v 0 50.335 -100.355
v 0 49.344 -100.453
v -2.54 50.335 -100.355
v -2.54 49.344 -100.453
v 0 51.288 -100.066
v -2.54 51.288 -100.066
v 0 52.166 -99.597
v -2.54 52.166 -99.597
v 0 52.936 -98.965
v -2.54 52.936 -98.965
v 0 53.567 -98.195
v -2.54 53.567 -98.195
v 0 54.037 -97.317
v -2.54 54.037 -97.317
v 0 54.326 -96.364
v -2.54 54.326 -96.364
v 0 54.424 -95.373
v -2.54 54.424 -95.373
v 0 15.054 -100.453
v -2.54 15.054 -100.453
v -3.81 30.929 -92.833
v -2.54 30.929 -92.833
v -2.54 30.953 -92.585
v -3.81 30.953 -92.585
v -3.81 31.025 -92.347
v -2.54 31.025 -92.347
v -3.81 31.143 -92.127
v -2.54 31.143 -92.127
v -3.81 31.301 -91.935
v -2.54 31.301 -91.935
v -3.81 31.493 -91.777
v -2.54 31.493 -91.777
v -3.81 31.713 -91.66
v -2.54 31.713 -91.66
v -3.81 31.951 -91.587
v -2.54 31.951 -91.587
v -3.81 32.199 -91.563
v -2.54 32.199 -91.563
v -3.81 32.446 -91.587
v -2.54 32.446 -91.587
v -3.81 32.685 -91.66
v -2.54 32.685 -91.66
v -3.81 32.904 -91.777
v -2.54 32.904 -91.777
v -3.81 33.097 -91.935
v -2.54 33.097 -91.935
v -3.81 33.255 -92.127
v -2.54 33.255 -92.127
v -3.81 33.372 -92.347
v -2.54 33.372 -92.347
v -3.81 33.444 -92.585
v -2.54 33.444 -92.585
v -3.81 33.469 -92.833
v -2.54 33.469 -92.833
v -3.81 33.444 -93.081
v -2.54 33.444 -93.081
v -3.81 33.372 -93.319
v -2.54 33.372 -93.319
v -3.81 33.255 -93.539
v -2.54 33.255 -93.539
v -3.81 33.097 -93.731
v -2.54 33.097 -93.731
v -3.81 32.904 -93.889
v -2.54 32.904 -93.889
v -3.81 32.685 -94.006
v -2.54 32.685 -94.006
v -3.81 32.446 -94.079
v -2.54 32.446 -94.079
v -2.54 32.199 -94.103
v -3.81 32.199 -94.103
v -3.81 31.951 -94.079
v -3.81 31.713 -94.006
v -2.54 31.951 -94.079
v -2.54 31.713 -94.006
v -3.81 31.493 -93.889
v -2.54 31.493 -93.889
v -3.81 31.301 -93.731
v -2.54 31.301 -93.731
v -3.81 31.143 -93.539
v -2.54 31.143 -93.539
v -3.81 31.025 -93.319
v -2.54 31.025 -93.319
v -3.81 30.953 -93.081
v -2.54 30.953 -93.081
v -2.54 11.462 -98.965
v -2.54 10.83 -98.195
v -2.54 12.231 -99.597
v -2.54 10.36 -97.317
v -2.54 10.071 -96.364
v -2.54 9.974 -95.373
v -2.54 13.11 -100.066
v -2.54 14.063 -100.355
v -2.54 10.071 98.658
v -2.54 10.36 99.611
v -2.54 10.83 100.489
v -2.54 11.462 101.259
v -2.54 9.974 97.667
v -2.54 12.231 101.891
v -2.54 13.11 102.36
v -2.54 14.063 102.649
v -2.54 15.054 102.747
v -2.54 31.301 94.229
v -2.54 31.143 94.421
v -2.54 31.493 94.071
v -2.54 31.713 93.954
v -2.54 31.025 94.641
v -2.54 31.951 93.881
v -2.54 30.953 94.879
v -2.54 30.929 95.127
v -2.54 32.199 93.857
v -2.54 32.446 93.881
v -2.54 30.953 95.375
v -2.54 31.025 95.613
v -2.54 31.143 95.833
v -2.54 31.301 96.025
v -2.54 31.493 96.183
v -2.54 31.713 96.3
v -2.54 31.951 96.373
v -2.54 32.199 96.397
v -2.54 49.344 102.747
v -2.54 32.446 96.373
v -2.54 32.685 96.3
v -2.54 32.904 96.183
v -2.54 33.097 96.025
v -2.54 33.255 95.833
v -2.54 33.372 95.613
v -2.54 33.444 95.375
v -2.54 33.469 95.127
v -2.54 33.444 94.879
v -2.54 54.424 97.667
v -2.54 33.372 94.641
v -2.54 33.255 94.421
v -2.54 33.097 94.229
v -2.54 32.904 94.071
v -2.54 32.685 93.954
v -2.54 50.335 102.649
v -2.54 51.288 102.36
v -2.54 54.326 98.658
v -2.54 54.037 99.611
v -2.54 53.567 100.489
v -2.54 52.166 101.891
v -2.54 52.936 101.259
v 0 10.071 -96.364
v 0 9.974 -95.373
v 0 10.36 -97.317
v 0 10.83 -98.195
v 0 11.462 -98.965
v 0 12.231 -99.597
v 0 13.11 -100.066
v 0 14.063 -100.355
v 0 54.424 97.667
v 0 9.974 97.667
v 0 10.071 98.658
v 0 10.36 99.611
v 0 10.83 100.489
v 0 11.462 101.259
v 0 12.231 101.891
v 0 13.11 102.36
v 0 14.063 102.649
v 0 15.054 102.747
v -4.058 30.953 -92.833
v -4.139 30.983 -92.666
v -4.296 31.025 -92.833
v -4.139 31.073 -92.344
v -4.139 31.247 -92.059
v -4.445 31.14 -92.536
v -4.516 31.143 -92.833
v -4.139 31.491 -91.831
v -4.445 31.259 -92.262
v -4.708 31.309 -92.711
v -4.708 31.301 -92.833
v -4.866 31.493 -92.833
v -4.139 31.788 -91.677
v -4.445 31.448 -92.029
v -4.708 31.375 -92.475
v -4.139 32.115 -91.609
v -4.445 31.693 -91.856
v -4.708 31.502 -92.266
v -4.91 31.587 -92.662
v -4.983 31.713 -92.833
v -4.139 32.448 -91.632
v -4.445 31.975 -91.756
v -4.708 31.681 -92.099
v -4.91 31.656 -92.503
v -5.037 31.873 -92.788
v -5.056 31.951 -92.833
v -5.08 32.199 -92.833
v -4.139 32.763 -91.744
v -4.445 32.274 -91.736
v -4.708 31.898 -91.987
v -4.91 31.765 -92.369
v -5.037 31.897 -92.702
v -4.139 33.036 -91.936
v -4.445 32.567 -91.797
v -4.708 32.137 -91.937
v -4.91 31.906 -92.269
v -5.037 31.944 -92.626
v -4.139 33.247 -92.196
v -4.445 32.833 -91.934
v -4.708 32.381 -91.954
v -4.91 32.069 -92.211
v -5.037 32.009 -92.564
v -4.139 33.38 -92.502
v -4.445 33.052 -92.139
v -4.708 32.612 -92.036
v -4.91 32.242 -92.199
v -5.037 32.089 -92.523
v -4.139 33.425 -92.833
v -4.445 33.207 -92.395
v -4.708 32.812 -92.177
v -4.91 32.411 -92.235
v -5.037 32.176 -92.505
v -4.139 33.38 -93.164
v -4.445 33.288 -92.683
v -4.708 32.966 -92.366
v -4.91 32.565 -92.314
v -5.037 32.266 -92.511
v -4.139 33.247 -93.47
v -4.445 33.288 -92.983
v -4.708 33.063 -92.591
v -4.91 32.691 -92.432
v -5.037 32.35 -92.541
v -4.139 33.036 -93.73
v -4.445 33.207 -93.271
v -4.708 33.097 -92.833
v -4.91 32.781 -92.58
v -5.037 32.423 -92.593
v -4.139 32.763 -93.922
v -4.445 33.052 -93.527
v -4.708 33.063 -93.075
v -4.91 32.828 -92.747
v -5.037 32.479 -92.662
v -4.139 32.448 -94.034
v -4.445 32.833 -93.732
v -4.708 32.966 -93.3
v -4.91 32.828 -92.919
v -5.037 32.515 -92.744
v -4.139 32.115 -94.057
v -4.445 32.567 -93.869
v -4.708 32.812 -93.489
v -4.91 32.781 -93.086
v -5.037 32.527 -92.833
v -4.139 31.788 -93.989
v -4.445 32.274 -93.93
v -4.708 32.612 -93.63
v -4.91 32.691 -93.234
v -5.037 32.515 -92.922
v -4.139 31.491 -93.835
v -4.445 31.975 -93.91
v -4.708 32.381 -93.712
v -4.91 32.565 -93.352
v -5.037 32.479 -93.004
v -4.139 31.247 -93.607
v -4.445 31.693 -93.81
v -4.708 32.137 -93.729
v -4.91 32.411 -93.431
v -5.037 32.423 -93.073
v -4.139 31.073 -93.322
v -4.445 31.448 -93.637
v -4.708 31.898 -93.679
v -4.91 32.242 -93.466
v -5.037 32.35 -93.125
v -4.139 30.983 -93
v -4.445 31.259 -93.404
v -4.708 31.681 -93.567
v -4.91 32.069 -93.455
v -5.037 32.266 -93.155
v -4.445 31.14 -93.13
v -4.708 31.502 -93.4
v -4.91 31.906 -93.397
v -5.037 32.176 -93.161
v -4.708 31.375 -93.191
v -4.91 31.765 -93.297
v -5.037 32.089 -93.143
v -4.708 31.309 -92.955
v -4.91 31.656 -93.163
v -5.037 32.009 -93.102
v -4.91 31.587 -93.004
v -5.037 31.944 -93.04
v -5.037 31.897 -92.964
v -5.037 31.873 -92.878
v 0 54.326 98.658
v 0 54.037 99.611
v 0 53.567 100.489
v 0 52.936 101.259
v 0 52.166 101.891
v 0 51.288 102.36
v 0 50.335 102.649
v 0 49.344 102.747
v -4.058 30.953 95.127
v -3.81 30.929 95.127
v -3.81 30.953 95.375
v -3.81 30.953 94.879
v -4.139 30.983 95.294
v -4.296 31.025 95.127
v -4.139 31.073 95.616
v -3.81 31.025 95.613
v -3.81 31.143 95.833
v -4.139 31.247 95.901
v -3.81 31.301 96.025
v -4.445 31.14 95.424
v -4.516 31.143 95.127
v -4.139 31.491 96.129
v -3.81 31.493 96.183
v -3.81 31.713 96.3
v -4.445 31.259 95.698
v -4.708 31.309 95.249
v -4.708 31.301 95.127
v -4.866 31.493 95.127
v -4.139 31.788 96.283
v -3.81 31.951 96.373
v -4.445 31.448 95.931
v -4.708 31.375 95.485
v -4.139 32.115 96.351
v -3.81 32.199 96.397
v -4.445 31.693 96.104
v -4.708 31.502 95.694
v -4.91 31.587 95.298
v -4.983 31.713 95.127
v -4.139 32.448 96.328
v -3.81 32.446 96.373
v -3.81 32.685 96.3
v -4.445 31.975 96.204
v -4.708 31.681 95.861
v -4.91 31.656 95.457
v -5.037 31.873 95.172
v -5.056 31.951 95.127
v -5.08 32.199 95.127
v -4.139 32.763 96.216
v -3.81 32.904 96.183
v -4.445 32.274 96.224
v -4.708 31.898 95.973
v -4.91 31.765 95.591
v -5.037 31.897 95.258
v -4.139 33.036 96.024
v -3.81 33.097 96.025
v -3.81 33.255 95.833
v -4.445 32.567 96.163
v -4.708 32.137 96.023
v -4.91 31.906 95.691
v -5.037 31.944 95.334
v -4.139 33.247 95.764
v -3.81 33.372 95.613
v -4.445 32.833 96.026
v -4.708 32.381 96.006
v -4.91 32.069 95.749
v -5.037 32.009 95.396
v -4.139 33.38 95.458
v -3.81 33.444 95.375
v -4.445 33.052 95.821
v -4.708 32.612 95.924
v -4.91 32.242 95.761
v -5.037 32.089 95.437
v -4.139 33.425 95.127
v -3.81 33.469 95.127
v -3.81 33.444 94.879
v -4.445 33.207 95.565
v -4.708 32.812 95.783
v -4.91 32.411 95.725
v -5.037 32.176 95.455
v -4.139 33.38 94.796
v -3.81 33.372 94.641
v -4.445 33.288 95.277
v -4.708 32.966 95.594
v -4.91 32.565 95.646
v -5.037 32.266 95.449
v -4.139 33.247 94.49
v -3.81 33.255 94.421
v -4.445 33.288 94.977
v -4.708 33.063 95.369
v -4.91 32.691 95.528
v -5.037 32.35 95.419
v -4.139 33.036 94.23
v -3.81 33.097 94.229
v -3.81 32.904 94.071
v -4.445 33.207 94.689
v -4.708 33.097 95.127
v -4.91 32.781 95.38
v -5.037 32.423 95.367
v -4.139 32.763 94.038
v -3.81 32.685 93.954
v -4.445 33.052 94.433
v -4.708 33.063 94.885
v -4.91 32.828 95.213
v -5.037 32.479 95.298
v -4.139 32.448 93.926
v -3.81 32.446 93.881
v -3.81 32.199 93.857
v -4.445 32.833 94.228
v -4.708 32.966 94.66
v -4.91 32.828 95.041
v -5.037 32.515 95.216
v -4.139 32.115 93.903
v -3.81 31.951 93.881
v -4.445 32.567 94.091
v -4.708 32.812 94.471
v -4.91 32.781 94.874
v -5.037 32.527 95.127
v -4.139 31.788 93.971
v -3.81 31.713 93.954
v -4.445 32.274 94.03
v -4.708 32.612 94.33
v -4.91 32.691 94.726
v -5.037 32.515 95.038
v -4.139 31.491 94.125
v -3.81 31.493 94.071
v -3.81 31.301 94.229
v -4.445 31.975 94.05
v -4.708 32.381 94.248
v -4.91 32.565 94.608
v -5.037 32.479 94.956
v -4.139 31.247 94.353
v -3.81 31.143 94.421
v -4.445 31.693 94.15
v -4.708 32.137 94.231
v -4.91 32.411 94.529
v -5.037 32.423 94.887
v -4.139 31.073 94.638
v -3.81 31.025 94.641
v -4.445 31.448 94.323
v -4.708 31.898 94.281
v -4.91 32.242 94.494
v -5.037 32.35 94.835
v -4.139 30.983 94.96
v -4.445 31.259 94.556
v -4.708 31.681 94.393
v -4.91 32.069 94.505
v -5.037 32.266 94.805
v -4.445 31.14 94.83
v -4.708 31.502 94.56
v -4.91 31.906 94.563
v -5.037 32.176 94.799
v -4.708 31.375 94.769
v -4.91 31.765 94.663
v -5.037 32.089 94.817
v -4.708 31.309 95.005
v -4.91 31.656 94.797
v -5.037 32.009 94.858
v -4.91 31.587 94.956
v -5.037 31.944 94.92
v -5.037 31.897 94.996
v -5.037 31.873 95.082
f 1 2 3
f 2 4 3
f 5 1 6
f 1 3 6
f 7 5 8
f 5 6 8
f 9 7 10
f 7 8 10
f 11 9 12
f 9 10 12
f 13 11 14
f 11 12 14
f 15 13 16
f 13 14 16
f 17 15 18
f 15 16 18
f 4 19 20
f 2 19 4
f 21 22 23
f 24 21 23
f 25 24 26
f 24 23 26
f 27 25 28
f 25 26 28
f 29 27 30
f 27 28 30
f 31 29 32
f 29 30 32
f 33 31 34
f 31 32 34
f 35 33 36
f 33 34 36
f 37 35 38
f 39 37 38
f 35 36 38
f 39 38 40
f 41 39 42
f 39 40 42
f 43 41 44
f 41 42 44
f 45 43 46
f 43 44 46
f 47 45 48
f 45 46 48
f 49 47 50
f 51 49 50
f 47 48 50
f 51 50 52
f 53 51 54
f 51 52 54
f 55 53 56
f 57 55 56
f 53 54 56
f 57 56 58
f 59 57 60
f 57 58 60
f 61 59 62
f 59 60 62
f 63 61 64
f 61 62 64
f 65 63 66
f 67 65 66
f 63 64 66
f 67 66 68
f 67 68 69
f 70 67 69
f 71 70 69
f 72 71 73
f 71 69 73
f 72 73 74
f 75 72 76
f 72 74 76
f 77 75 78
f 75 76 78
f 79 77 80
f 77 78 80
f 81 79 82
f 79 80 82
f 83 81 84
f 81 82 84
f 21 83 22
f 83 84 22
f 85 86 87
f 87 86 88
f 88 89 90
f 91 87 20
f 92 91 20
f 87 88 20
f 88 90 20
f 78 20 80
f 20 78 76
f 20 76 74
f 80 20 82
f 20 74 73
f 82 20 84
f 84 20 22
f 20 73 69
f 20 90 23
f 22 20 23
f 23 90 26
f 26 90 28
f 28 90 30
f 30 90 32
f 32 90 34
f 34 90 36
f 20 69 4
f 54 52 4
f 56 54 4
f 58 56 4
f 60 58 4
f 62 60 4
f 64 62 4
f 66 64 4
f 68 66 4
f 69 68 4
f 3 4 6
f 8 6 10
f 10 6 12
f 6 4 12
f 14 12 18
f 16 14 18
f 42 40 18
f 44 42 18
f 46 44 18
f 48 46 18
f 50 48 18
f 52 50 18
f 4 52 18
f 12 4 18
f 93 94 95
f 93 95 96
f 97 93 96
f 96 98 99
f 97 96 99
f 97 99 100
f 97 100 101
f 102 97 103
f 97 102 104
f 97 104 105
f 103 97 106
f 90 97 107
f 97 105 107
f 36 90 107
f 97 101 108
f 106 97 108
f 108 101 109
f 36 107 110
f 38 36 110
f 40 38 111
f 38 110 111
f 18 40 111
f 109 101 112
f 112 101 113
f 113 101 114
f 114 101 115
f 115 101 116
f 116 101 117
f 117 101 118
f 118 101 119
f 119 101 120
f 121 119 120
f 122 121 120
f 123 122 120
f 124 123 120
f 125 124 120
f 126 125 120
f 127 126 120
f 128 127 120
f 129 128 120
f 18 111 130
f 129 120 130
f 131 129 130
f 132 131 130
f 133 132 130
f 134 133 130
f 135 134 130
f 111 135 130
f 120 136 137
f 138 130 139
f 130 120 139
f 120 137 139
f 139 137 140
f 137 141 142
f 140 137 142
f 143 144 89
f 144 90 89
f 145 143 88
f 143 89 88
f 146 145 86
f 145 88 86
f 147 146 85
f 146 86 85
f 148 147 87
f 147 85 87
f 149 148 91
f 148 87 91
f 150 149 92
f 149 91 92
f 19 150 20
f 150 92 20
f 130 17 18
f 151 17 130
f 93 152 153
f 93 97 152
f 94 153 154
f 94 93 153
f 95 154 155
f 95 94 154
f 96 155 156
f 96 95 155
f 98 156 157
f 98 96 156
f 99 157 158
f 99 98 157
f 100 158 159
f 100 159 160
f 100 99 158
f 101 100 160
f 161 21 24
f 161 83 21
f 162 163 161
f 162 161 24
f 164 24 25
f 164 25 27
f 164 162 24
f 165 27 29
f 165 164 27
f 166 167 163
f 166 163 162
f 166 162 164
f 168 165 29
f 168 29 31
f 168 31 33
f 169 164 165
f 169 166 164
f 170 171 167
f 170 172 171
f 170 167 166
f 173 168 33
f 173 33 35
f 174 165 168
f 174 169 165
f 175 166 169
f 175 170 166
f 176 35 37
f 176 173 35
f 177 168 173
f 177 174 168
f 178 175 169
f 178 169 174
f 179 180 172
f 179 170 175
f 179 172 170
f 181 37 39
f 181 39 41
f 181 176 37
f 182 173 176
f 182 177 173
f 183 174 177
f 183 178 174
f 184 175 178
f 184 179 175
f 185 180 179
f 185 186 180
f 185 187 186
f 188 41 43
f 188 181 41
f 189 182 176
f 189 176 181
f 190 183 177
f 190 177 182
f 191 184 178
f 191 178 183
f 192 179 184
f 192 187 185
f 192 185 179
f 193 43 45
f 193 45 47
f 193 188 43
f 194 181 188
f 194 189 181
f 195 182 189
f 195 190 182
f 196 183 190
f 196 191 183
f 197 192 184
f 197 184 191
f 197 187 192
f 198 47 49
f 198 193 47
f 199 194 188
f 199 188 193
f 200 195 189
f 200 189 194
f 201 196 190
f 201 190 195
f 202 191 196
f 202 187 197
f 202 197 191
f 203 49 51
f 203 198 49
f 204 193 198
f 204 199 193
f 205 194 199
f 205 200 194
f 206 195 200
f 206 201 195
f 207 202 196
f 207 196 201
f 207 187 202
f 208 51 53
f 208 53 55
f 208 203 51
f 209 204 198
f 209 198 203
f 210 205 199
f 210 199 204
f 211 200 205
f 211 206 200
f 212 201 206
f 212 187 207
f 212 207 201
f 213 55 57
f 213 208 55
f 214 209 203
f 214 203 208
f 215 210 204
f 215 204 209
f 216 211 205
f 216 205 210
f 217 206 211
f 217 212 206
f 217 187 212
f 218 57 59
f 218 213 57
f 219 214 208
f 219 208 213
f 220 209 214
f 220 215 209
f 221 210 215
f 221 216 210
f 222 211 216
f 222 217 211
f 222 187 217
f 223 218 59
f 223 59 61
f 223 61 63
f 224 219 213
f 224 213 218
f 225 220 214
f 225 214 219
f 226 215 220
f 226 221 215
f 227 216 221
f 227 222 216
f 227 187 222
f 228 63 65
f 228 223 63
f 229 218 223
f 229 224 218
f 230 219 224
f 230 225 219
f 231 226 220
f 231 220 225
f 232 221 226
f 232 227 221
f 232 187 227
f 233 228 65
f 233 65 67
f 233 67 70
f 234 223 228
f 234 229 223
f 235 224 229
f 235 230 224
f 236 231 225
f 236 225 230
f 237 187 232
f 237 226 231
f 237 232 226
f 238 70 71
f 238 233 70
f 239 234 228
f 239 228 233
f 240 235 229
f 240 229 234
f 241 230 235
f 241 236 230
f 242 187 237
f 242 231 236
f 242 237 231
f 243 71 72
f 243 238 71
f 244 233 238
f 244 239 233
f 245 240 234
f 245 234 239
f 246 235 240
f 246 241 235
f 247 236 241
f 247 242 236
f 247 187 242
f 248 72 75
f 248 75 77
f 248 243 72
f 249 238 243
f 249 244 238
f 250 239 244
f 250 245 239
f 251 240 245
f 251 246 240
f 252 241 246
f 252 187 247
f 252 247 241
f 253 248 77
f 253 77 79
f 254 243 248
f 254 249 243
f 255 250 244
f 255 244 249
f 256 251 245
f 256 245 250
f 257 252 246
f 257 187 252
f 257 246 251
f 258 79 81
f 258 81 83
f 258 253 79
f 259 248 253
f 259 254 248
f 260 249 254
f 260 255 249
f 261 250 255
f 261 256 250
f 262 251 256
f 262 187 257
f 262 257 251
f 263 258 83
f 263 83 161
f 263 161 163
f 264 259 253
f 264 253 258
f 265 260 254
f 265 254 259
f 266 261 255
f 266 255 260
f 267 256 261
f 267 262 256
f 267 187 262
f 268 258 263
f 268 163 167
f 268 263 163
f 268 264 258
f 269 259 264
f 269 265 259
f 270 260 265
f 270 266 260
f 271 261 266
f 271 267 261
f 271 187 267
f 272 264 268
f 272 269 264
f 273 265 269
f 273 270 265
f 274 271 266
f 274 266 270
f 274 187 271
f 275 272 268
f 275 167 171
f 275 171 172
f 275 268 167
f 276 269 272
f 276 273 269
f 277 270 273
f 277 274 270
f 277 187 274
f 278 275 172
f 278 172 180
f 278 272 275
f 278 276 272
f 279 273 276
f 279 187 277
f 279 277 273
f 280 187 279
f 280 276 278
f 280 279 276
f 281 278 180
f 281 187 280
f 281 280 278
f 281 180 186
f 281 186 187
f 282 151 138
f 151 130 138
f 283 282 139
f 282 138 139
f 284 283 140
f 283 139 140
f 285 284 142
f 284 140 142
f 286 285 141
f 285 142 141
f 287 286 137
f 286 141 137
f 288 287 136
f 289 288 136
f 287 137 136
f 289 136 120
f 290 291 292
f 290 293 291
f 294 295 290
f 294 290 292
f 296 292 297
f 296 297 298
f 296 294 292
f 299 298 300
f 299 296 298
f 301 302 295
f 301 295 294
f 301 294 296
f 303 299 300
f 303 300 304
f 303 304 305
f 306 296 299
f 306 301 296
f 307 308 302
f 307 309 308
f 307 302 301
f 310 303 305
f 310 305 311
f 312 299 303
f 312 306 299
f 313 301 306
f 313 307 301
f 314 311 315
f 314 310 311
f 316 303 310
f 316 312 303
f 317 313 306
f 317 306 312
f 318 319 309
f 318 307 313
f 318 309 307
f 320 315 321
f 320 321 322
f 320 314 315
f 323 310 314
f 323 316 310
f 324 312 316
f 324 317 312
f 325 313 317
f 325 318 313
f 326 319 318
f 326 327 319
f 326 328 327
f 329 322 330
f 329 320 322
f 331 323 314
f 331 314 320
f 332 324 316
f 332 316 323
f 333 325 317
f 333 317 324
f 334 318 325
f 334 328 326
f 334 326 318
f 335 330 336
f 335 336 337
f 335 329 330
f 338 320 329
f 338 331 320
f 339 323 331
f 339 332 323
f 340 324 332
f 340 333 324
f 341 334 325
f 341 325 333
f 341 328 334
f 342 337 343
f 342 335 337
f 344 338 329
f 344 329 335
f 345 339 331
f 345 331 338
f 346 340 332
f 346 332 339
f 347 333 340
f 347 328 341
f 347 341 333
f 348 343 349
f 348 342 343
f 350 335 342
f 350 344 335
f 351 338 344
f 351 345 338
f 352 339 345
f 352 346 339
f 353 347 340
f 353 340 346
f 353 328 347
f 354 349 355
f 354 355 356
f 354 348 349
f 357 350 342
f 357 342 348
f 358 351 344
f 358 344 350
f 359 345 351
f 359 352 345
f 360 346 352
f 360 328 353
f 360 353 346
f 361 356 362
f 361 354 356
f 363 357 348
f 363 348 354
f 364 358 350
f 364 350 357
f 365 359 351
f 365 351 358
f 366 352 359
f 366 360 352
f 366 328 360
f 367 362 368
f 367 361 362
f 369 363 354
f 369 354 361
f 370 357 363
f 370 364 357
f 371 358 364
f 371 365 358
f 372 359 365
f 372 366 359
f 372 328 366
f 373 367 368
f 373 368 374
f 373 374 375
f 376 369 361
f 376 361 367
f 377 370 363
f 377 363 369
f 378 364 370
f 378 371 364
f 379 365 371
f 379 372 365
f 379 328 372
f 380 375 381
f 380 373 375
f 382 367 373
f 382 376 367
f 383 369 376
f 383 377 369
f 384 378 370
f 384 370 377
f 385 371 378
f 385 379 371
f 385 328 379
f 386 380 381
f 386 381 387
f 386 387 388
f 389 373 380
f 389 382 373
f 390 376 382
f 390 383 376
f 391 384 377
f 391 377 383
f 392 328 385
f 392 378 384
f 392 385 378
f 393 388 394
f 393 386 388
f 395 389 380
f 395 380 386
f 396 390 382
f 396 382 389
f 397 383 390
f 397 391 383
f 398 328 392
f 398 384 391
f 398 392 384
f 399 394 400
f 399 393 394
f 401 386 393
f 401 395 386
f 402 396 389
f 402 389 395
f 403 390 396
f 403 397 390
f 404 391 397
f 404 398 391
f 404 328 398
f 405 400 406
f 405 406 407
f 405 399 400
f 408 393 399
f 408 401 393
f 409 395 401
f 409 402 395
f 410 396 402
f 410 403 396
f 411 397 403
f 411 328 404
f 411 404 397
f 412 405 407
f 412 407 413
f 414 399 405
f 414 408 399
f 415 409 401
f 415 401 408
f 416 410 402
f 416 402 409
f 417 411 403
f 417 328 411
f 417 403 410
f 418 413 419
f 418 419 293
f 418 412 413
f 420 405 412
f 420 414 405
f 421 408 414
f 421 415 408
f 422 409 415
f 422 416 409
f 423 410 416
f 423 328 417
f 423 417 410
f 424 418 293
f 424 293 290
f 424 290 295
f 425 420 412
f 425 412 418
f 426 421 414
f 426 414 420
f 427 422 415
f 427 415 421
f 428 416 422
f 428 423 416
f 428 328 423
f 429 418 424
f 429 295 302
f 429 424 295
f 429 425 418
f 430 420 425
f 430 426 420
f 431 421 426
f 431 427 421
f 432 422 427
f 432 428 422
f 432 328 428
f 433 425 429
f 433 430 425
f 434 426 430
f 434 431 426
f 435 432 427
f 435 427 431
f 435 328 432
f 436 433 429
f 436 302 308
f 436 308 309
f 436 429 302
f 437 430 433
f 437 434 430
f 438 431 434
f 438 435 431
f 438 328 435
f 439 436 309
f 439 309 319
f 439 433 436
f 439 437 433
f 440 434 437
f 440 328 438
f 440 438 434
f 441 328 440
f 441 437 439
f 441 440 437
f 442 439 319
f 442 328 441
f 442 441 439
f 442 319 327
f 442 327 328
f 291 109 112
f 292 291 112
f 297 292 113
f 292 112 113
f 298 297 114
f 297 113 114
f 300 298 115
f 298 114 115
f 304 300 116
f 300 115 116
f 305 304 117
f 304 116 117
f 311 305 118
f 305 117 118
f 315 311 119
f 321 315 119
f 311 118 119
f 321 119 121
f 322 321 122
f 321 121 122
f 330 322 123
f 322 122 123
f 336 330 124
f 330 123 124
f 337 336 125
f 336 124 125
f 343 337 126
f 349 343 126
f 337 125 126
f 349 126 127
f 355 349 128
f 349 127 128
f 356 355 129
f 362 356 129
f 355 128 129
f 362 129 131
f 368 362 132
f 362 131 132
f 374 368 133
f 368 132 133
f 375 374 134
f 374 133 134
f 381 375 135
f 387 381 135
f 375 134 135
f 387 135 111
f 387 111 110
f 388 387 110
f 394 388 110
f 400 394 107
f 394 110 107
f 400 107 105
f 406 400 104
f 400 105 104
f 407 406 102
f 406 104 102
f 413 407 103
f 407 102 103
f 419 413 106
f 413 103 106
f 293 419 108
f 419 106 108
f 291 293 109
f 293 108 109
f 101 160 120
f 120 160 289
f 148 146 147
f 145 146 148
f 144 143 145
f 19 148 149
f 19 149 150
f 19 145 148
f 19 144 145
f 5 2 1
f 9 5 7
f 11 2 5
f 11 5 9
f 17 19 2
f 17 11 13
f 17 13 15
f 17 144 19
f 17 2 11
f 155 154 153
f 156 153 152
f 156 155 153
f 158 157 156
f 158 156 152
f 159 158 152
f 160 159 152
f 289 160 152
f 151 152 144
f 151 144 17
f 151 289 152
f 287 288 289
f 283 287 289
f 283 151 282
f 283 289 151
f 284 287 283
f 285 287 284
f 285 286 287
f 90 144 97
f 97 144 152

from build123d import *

# Parameters (mm, degrees)
F0_W     = 44.45
F0_H     = 203.2
F1_DEPTH = 2.54
F2_R     = 5.08
F3_R     = 1.27
F4_DEPTH = 2.54
F5_R     = 1.27
F6_R     = 1.27
F7_DEPTH = 2.54
F8_R     = 1.27


with BuildPart() as f1:
    # F0 (on Right) → F1 (new body)
    with BuildSketch(Plane.YZ):
        with Locations((32.198633, 1.147029)):
            Rectangle(F0_W, F0_H)
    extrude(amount=-F1_DEPTH)

    # F2
    f2_edges = [f1.edges().sort_by_distance(p)[0] for p in [
        (-1.27, 54.423633, 102.747029),
        (-1.27, 9.973633, 102.747029),
        (-1.27, 54.423633, -100.452971),
        (-1.27, 9.973633, -100.452971),
    ]]
    fillet(f2_edges, radius=F2_R)

    # F3 (on face) → F4 (join)
    with BuildSketch(Plane(origin=(-2.54, 0, 0), x_dir=(0, -1, 0), z_dir=(-1, 0, 0))):
        with Locations((-32.198633, 95.127029)):
            Circle(F3_R)
    extrude(amount=F4_DEPTH)

    # F5
    f5_edges = [f1.edges().sort_by_distance(p)[0] for p in [
        (-5.08, 33.468633, 95.127029),
    ]]
    fillet(f5_edges, radius=F5_R)

    # F6 (on face) → F7 (join)
    with BuildSketch(Plane(origin=(-2.54, 0, 0), x_dir=(0, -1, 0), z_dir=(-1, 0, 0))):
        with Locations((-32.198633, -92.832971)):
            Circle(F6_R)
    extrude(amount=F7_DEPTH)

    # F8
    f8_edges = [f1.edges().sort_by_distance(p)[0] for p in [
        (-5.08, 33.468633, -92.832971),
    ]]
    fillet(f8_edges, radius=F8_R)


solid = f1.part
